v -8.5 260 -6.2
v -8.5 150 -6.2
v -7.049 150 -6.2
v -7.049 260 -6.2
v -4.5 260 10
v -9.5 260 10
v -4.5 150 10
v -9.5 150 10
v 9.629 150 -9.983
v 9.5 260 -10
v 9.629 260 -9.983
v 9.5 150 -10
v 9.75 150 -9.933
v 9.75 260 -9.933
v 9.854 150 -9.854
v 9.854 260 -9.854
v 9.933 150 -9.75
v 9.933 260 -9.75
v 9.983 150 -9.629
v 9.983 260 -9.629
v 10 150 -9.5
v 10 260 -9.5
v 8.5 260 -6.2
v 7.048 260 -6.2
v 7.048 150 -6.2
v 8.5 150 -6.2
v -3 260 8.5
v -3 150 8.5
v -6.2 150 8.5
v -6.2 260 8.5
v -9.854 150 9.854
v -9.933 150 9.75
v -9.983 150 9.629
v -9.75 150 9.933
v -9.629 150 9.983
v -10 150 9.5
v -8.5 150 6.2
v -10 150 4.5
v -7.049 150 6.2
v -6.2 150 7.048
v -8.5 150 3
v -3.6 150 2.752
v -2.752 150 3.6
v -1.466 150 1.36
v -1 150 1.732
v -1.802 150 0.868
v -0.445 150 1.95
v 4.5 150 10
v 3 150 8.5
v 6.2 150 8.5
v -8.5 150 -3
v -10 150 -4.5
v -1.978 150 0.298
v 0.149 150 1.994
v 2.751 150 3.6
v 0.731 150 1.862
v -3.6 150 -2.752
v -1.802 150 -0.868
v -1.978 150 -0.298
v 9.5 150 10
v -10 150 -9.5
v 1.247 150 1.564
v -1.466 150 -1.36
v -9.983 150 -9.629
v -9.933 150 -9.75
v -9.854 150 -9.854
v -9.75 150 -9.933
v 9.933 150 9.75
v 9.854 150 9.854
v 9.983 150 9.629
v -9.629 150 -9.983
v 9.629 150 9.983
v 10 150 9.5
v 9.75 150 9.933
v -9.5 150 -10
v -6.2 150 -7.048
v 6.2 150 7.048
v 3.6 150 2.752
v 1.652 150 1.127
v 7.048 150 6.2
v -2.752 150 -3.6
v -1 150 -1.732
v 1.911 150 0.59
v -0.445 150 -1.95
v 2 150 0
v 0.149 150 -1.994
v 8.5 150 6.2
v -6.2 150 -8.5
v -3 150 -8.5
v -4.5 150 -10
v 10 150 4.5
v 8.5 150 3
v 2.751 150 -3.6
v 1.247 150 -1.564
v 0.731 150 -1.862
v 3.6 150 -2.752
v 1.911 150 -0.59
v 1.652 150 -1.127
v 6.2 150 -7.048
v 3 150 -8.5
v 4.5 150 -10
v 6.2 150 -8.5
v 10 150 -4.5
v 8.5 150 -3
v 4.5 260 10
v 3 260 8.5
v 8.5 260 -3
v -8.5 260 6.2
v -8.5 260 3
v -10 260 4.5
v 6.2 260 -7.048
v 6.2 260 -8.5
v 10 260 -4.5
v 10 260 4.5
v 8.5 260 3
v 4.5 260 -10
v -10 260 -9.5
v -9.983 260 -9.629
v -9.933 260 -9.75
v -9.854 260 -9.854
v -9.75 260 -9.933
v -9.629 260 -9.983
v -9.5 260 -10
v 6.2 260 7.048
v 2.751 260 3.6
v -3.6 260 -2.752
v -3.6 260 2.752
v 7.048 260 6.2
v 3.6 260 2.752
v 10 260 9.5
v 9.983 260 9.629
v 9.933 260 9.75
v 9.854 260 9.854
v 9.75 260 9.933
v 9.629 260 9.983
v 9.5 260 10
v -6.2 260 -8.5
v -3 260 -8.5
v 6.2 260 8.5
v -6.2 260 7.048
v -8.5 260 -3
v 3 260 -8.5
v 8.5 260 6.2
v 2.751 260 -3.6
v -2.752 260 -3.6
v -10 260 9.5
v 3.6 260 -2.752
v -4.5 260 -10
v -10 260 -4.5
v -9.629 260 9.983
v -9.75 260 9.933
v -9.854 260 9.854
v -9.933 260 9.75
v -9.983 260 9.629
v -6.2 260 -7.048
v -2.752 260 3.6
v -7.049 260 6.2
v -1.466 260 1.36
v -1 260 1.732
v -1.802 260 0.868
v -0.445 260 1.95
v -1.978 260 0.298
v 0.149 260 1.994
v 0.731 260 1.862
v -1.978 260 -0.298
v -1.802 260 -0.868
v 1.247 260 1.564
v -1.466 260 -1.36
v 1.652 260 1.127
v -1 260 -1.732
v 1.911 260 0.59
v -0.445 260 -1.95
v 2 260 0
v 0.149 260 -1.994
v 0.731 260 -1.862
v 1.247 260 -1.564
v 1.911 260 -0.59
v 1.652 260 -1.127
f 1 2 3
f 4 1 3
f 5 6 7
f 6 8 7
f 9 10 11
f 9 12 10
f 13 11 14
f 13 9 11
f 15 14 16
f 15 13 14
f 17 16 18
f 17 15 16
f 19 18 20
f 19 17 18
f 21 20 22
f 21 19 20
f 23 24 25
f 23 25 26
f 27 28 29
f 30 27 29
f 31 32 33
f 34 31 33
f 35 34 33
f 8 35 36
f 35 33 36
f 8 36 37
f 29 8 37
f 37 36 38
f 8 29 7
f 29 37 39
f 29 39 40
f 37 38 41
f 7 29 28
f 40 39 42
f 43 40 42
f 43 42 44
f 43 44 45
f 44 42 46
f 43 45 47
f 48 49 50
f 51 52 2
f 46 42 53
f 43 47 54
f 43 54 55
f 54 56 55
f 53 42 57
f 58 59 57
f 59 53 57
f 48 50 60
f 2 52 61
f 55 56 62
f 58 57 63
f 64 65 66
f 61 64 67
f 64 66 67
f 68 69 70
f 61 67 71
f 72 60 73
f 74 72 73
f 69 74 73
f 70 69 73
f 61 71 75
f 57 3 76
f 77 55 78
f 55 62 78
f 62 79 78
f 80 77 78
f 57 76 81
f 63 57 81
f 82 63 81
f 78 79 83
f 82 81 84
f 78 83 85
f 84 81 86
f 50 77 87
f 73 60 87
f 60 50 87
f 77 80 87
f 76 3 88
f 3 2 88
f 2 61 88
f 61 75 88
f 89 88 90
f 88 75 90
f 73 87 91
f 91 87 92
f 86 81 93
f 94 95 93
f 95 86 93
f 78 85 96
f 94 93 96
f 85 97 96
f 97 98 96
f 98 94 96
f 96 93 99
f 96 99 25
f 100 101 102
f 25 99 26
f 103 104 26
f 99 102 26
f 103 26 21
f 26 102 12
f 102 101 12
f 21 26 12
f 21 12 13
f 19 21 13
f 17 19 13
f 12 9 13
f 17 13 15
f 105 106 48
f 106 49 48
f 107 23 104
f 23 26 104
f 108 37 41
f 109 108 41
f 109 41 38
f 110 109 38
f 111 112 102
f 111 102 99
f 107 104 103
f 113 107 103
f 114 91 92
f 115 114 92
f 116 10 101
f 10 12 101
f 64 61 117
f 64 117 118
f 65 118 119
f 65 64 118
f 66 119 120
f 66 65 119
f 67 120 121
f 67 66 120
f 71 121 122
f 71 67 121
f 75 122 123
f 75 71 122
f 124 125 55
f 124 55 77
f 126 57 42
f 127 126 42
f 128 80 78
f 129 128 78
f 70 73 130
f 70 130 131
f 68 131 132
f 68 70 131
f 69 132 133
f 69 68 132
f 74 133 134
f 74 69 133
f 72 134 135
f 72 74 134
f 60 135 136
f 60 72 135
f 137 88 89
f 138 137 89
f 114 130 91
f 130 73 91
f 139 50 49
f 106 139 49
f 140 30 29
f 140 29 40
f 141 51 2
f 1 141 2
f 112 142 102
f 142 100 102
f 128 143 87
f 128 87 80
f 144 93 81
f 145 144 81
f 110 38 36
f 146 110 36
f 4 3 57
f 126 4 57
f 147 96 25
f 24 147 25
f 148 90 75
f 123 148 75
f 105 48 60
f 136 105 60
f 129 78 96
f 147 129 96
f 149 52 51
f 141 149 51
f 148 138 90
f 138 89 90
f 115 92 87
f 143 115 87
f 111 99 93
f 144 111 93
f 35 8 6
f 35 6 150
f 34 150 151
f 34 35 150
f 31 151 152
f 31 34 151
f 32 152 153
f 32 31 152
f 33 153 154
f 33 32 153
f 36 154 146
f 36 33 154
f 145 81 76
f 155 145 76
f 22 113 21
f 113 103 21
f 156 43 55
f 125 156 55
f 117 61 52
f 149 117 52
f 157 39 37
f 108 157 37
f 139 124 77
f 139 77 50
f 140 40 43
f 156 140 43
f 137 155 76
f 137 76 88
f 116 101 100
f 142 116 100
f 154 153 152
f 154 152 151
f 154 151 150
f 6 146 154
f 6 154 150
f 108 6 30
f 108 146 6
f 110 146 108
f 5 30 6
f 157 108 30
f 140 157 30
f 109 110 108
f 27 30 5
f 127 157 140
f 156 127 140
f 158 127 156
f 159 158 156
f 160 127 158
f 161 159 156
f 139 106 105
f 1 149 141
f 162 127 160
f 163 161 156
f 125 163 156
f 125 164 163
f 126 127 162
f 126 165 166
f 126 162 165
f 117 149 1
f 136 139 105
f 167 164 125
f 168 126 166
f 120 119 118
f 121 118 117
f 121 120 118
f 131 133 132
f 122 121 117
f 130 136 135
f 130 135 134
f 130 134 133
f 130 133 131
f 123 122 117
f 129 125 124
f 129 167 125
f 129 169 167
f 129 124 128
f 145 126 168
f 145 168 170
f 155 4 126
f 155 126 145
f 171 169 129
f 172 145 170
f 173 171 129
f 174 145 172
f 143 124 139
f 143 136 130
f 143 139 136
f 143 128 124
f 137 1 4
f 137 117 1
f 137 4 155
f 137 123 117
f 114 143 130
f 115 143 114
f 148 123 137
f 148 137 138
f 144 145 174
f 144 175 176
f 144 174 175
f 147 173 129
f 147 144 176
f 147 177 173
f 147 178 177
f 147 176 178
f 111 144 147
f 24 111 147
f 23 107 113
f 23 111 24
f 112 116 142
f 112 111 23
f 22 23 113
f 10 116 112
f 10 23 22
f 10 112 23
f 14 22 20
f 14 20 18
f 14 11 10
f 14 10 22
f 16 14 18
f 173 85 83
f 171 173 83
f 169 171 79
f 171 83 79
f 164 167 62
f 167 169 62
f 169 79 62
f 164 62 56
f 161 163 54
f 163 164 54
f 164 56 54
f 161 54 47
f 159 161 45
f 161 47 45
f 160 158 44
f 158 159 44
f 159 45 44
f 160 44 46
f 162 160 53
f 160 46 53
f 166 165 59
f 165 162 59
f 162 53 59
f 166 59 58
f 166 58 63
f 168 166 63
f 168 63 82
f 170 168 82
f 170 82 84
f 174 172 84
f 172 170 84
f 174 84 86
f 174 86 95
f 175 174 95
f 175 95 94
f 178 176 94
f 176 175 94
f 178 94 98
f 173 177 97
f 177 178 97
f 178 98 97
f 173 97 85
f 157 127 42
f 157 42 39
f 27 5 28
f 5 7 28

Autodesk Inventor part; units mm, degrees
ref_plane "YZ Plane" through (0, 0, 0) normal (1, 0, 0) x (0, 1, 0)
ref_plane "XZ Plane" through (0, 0, 0) normal (0, 1, 0) x (-1, 0, 0)
ref_plane "Work Plane1" through (-2.7515, 150, 3.6) normal (0, 1, 0) x (1, 0, 0)
sketch "Sketch1" plane through (-2.7515, 150, 3.6) normal (0, 1, 0) x (1, 0, 0)
  arc A0 (-6.7485, 13.6) -> (-7.2485, 13.1) centre (-6.7485, 13.1) ccw projected
  line L0 (-7.2485, 13.1) -> (-7.2485, 8.1) projected
  line L1 (-7.2485, 8.1) -> (-5.7485, 6.6) projected
  line L2 (-5.7485, 6.6) -> (-5.7485, 9.8) projected
  line L3 (-5.7485, 9.8) -> (-4.2971, 9.8) projected
  line L4 (-4.2971, 9.8) -> (-0.8485, 6.3515) projected
  line L5 (-0.8485, 6.3515) -> (-0.8485, 0.8485) projected
  line L6 (-0.8485, 0.8485) -> (-4.2971, -2.6) projected
  line L7 (-4.2971, -2.6) -> (-5.7485, -2.6) projected
  line L8 (-5.7485, -2.6) -> (-5.7485, 0.6) projected
  line L9 (-5.7485, 0.6) -> (-7.2485, -0.9) projected
  line L10 (-7.2485, -0.9) -> (-7.2485, -5.9) projected
  arc A1 (-7.2485, -5.9) -> (-6.7485, -6.4) centre (-6.7485, -5.9) ccw projected
  line L11 (-6.7485, -6.4) -> (-1.7485, -6.4) projected
  line L12 (-1.7485, -6.4) -> (-0.2485, -4.9) projected
  line L13 (-0.2485, -4.9) -> (-3.4485, -4.9) projected
  line L14 (-3.4485, -4.9) -> (-3.4485, -3.4485) projected
  line L15 (-3.4485, -3.4485) -> (0, 0) projected
  line L16 (0, 0) -> (5.5029, 0) projected
  line L17 (5.5029, 0) -> (8.9515, -3.4485) projected
  line L18 (8.9515, -3.4485) -> (8.9515, -4.9) projected
  line L19 (8.9515, -4.9) -> (5.7515, -4.9) projected
  line L20 (5.7515, -4.9) -> (7.2515, -6.4) projected
  line L21 (7.2515, -6.4) -> (12.2515, -6.4) projected
  arc A2 (12.2515, -6.4) -> (12.7515, -5.9) centre (12.2515, -5.9) ccw projected
  line L22 (12.7515, -5.9) -> (12.7515, -0.9) projected
  line L23 (12.7515, -0.9) -> (11.2515, 0.6) projected
  line L24 (11.2515, 0.6) -> (11.2515, -2.6) projected
  line L25 (11.2515, -2.6) -> (9.8, -2.6) projected
  line L26 (9.8, -2.6) -> (6.3515, 0.8485) projected
  line L27 (6.3515, 0.8485) -> (6.3515, 6.3515) projected
  line L28 (6.3515, 6.3515) -> (9.8, 9.8) projected
  line L29 (9.8, 9.8) -> (11.2515, 9.8) projected
  line L30 (11.2515, 9.8) -> (11.2515, 6.6) projected
  line L31 (11.2515, 6.6) -> (12.7515, 8.1) projected
  line L32 (12.7515, 8.1) -> (12.7515, 13.1) projected
  arc A3 (12.7515, 13.1) -> (12.2515, 13.6) centre (12.2515, 13.1) ccw projected
  line L33 (12.2515, 13.6) -> (7.2515, 13.6) projected
  line L34 (7.2515, 13.6) -> (5.7515, 12.1) projected
  line L35 (5.7515, 12.1) -> (8.9515, 12.1) projected
  line L36 (8.9515, 12.1) -> (8.9515, 10.6485) projected
  line L37 (8.9515, 10.6485) -> (5.5029, 7.2) projected
  line L38 (5.5029, 7.2) -> (0, 7.2) projected
  line L39 (0, 7.2) -> (-3.4485, 10.6485) projected
  line L40 (-3.4485, 10.6485) -> (-3.4485, 12.1) projected
  line L41 (-3.4485, 12.1) -> (-0.2485, 12.1) projected
  line L42 (-0.2485, 12.1) -> (-1.7485, 13.6) projected
  line L43 (-1.7485, 13.6) -> (-6.7485, 13.6) projected
  circle A4 centre (2.7515, 3.6) radius 2 projected
extrude "Extrusion1" add sketch "Sketch1" along normal blind 110
ref_plane "Work Plane2" through (0, 150, -9.5) normal (1, 0, 0) x (0, 0, -1)
ref_plane "Work Plane3" through (-4.5, 150, 0) normal (0, 0, 1) x (1, 0, 0)
properties part number "20x20mmx150mm alminum profile" material "Aluminum 6061"
